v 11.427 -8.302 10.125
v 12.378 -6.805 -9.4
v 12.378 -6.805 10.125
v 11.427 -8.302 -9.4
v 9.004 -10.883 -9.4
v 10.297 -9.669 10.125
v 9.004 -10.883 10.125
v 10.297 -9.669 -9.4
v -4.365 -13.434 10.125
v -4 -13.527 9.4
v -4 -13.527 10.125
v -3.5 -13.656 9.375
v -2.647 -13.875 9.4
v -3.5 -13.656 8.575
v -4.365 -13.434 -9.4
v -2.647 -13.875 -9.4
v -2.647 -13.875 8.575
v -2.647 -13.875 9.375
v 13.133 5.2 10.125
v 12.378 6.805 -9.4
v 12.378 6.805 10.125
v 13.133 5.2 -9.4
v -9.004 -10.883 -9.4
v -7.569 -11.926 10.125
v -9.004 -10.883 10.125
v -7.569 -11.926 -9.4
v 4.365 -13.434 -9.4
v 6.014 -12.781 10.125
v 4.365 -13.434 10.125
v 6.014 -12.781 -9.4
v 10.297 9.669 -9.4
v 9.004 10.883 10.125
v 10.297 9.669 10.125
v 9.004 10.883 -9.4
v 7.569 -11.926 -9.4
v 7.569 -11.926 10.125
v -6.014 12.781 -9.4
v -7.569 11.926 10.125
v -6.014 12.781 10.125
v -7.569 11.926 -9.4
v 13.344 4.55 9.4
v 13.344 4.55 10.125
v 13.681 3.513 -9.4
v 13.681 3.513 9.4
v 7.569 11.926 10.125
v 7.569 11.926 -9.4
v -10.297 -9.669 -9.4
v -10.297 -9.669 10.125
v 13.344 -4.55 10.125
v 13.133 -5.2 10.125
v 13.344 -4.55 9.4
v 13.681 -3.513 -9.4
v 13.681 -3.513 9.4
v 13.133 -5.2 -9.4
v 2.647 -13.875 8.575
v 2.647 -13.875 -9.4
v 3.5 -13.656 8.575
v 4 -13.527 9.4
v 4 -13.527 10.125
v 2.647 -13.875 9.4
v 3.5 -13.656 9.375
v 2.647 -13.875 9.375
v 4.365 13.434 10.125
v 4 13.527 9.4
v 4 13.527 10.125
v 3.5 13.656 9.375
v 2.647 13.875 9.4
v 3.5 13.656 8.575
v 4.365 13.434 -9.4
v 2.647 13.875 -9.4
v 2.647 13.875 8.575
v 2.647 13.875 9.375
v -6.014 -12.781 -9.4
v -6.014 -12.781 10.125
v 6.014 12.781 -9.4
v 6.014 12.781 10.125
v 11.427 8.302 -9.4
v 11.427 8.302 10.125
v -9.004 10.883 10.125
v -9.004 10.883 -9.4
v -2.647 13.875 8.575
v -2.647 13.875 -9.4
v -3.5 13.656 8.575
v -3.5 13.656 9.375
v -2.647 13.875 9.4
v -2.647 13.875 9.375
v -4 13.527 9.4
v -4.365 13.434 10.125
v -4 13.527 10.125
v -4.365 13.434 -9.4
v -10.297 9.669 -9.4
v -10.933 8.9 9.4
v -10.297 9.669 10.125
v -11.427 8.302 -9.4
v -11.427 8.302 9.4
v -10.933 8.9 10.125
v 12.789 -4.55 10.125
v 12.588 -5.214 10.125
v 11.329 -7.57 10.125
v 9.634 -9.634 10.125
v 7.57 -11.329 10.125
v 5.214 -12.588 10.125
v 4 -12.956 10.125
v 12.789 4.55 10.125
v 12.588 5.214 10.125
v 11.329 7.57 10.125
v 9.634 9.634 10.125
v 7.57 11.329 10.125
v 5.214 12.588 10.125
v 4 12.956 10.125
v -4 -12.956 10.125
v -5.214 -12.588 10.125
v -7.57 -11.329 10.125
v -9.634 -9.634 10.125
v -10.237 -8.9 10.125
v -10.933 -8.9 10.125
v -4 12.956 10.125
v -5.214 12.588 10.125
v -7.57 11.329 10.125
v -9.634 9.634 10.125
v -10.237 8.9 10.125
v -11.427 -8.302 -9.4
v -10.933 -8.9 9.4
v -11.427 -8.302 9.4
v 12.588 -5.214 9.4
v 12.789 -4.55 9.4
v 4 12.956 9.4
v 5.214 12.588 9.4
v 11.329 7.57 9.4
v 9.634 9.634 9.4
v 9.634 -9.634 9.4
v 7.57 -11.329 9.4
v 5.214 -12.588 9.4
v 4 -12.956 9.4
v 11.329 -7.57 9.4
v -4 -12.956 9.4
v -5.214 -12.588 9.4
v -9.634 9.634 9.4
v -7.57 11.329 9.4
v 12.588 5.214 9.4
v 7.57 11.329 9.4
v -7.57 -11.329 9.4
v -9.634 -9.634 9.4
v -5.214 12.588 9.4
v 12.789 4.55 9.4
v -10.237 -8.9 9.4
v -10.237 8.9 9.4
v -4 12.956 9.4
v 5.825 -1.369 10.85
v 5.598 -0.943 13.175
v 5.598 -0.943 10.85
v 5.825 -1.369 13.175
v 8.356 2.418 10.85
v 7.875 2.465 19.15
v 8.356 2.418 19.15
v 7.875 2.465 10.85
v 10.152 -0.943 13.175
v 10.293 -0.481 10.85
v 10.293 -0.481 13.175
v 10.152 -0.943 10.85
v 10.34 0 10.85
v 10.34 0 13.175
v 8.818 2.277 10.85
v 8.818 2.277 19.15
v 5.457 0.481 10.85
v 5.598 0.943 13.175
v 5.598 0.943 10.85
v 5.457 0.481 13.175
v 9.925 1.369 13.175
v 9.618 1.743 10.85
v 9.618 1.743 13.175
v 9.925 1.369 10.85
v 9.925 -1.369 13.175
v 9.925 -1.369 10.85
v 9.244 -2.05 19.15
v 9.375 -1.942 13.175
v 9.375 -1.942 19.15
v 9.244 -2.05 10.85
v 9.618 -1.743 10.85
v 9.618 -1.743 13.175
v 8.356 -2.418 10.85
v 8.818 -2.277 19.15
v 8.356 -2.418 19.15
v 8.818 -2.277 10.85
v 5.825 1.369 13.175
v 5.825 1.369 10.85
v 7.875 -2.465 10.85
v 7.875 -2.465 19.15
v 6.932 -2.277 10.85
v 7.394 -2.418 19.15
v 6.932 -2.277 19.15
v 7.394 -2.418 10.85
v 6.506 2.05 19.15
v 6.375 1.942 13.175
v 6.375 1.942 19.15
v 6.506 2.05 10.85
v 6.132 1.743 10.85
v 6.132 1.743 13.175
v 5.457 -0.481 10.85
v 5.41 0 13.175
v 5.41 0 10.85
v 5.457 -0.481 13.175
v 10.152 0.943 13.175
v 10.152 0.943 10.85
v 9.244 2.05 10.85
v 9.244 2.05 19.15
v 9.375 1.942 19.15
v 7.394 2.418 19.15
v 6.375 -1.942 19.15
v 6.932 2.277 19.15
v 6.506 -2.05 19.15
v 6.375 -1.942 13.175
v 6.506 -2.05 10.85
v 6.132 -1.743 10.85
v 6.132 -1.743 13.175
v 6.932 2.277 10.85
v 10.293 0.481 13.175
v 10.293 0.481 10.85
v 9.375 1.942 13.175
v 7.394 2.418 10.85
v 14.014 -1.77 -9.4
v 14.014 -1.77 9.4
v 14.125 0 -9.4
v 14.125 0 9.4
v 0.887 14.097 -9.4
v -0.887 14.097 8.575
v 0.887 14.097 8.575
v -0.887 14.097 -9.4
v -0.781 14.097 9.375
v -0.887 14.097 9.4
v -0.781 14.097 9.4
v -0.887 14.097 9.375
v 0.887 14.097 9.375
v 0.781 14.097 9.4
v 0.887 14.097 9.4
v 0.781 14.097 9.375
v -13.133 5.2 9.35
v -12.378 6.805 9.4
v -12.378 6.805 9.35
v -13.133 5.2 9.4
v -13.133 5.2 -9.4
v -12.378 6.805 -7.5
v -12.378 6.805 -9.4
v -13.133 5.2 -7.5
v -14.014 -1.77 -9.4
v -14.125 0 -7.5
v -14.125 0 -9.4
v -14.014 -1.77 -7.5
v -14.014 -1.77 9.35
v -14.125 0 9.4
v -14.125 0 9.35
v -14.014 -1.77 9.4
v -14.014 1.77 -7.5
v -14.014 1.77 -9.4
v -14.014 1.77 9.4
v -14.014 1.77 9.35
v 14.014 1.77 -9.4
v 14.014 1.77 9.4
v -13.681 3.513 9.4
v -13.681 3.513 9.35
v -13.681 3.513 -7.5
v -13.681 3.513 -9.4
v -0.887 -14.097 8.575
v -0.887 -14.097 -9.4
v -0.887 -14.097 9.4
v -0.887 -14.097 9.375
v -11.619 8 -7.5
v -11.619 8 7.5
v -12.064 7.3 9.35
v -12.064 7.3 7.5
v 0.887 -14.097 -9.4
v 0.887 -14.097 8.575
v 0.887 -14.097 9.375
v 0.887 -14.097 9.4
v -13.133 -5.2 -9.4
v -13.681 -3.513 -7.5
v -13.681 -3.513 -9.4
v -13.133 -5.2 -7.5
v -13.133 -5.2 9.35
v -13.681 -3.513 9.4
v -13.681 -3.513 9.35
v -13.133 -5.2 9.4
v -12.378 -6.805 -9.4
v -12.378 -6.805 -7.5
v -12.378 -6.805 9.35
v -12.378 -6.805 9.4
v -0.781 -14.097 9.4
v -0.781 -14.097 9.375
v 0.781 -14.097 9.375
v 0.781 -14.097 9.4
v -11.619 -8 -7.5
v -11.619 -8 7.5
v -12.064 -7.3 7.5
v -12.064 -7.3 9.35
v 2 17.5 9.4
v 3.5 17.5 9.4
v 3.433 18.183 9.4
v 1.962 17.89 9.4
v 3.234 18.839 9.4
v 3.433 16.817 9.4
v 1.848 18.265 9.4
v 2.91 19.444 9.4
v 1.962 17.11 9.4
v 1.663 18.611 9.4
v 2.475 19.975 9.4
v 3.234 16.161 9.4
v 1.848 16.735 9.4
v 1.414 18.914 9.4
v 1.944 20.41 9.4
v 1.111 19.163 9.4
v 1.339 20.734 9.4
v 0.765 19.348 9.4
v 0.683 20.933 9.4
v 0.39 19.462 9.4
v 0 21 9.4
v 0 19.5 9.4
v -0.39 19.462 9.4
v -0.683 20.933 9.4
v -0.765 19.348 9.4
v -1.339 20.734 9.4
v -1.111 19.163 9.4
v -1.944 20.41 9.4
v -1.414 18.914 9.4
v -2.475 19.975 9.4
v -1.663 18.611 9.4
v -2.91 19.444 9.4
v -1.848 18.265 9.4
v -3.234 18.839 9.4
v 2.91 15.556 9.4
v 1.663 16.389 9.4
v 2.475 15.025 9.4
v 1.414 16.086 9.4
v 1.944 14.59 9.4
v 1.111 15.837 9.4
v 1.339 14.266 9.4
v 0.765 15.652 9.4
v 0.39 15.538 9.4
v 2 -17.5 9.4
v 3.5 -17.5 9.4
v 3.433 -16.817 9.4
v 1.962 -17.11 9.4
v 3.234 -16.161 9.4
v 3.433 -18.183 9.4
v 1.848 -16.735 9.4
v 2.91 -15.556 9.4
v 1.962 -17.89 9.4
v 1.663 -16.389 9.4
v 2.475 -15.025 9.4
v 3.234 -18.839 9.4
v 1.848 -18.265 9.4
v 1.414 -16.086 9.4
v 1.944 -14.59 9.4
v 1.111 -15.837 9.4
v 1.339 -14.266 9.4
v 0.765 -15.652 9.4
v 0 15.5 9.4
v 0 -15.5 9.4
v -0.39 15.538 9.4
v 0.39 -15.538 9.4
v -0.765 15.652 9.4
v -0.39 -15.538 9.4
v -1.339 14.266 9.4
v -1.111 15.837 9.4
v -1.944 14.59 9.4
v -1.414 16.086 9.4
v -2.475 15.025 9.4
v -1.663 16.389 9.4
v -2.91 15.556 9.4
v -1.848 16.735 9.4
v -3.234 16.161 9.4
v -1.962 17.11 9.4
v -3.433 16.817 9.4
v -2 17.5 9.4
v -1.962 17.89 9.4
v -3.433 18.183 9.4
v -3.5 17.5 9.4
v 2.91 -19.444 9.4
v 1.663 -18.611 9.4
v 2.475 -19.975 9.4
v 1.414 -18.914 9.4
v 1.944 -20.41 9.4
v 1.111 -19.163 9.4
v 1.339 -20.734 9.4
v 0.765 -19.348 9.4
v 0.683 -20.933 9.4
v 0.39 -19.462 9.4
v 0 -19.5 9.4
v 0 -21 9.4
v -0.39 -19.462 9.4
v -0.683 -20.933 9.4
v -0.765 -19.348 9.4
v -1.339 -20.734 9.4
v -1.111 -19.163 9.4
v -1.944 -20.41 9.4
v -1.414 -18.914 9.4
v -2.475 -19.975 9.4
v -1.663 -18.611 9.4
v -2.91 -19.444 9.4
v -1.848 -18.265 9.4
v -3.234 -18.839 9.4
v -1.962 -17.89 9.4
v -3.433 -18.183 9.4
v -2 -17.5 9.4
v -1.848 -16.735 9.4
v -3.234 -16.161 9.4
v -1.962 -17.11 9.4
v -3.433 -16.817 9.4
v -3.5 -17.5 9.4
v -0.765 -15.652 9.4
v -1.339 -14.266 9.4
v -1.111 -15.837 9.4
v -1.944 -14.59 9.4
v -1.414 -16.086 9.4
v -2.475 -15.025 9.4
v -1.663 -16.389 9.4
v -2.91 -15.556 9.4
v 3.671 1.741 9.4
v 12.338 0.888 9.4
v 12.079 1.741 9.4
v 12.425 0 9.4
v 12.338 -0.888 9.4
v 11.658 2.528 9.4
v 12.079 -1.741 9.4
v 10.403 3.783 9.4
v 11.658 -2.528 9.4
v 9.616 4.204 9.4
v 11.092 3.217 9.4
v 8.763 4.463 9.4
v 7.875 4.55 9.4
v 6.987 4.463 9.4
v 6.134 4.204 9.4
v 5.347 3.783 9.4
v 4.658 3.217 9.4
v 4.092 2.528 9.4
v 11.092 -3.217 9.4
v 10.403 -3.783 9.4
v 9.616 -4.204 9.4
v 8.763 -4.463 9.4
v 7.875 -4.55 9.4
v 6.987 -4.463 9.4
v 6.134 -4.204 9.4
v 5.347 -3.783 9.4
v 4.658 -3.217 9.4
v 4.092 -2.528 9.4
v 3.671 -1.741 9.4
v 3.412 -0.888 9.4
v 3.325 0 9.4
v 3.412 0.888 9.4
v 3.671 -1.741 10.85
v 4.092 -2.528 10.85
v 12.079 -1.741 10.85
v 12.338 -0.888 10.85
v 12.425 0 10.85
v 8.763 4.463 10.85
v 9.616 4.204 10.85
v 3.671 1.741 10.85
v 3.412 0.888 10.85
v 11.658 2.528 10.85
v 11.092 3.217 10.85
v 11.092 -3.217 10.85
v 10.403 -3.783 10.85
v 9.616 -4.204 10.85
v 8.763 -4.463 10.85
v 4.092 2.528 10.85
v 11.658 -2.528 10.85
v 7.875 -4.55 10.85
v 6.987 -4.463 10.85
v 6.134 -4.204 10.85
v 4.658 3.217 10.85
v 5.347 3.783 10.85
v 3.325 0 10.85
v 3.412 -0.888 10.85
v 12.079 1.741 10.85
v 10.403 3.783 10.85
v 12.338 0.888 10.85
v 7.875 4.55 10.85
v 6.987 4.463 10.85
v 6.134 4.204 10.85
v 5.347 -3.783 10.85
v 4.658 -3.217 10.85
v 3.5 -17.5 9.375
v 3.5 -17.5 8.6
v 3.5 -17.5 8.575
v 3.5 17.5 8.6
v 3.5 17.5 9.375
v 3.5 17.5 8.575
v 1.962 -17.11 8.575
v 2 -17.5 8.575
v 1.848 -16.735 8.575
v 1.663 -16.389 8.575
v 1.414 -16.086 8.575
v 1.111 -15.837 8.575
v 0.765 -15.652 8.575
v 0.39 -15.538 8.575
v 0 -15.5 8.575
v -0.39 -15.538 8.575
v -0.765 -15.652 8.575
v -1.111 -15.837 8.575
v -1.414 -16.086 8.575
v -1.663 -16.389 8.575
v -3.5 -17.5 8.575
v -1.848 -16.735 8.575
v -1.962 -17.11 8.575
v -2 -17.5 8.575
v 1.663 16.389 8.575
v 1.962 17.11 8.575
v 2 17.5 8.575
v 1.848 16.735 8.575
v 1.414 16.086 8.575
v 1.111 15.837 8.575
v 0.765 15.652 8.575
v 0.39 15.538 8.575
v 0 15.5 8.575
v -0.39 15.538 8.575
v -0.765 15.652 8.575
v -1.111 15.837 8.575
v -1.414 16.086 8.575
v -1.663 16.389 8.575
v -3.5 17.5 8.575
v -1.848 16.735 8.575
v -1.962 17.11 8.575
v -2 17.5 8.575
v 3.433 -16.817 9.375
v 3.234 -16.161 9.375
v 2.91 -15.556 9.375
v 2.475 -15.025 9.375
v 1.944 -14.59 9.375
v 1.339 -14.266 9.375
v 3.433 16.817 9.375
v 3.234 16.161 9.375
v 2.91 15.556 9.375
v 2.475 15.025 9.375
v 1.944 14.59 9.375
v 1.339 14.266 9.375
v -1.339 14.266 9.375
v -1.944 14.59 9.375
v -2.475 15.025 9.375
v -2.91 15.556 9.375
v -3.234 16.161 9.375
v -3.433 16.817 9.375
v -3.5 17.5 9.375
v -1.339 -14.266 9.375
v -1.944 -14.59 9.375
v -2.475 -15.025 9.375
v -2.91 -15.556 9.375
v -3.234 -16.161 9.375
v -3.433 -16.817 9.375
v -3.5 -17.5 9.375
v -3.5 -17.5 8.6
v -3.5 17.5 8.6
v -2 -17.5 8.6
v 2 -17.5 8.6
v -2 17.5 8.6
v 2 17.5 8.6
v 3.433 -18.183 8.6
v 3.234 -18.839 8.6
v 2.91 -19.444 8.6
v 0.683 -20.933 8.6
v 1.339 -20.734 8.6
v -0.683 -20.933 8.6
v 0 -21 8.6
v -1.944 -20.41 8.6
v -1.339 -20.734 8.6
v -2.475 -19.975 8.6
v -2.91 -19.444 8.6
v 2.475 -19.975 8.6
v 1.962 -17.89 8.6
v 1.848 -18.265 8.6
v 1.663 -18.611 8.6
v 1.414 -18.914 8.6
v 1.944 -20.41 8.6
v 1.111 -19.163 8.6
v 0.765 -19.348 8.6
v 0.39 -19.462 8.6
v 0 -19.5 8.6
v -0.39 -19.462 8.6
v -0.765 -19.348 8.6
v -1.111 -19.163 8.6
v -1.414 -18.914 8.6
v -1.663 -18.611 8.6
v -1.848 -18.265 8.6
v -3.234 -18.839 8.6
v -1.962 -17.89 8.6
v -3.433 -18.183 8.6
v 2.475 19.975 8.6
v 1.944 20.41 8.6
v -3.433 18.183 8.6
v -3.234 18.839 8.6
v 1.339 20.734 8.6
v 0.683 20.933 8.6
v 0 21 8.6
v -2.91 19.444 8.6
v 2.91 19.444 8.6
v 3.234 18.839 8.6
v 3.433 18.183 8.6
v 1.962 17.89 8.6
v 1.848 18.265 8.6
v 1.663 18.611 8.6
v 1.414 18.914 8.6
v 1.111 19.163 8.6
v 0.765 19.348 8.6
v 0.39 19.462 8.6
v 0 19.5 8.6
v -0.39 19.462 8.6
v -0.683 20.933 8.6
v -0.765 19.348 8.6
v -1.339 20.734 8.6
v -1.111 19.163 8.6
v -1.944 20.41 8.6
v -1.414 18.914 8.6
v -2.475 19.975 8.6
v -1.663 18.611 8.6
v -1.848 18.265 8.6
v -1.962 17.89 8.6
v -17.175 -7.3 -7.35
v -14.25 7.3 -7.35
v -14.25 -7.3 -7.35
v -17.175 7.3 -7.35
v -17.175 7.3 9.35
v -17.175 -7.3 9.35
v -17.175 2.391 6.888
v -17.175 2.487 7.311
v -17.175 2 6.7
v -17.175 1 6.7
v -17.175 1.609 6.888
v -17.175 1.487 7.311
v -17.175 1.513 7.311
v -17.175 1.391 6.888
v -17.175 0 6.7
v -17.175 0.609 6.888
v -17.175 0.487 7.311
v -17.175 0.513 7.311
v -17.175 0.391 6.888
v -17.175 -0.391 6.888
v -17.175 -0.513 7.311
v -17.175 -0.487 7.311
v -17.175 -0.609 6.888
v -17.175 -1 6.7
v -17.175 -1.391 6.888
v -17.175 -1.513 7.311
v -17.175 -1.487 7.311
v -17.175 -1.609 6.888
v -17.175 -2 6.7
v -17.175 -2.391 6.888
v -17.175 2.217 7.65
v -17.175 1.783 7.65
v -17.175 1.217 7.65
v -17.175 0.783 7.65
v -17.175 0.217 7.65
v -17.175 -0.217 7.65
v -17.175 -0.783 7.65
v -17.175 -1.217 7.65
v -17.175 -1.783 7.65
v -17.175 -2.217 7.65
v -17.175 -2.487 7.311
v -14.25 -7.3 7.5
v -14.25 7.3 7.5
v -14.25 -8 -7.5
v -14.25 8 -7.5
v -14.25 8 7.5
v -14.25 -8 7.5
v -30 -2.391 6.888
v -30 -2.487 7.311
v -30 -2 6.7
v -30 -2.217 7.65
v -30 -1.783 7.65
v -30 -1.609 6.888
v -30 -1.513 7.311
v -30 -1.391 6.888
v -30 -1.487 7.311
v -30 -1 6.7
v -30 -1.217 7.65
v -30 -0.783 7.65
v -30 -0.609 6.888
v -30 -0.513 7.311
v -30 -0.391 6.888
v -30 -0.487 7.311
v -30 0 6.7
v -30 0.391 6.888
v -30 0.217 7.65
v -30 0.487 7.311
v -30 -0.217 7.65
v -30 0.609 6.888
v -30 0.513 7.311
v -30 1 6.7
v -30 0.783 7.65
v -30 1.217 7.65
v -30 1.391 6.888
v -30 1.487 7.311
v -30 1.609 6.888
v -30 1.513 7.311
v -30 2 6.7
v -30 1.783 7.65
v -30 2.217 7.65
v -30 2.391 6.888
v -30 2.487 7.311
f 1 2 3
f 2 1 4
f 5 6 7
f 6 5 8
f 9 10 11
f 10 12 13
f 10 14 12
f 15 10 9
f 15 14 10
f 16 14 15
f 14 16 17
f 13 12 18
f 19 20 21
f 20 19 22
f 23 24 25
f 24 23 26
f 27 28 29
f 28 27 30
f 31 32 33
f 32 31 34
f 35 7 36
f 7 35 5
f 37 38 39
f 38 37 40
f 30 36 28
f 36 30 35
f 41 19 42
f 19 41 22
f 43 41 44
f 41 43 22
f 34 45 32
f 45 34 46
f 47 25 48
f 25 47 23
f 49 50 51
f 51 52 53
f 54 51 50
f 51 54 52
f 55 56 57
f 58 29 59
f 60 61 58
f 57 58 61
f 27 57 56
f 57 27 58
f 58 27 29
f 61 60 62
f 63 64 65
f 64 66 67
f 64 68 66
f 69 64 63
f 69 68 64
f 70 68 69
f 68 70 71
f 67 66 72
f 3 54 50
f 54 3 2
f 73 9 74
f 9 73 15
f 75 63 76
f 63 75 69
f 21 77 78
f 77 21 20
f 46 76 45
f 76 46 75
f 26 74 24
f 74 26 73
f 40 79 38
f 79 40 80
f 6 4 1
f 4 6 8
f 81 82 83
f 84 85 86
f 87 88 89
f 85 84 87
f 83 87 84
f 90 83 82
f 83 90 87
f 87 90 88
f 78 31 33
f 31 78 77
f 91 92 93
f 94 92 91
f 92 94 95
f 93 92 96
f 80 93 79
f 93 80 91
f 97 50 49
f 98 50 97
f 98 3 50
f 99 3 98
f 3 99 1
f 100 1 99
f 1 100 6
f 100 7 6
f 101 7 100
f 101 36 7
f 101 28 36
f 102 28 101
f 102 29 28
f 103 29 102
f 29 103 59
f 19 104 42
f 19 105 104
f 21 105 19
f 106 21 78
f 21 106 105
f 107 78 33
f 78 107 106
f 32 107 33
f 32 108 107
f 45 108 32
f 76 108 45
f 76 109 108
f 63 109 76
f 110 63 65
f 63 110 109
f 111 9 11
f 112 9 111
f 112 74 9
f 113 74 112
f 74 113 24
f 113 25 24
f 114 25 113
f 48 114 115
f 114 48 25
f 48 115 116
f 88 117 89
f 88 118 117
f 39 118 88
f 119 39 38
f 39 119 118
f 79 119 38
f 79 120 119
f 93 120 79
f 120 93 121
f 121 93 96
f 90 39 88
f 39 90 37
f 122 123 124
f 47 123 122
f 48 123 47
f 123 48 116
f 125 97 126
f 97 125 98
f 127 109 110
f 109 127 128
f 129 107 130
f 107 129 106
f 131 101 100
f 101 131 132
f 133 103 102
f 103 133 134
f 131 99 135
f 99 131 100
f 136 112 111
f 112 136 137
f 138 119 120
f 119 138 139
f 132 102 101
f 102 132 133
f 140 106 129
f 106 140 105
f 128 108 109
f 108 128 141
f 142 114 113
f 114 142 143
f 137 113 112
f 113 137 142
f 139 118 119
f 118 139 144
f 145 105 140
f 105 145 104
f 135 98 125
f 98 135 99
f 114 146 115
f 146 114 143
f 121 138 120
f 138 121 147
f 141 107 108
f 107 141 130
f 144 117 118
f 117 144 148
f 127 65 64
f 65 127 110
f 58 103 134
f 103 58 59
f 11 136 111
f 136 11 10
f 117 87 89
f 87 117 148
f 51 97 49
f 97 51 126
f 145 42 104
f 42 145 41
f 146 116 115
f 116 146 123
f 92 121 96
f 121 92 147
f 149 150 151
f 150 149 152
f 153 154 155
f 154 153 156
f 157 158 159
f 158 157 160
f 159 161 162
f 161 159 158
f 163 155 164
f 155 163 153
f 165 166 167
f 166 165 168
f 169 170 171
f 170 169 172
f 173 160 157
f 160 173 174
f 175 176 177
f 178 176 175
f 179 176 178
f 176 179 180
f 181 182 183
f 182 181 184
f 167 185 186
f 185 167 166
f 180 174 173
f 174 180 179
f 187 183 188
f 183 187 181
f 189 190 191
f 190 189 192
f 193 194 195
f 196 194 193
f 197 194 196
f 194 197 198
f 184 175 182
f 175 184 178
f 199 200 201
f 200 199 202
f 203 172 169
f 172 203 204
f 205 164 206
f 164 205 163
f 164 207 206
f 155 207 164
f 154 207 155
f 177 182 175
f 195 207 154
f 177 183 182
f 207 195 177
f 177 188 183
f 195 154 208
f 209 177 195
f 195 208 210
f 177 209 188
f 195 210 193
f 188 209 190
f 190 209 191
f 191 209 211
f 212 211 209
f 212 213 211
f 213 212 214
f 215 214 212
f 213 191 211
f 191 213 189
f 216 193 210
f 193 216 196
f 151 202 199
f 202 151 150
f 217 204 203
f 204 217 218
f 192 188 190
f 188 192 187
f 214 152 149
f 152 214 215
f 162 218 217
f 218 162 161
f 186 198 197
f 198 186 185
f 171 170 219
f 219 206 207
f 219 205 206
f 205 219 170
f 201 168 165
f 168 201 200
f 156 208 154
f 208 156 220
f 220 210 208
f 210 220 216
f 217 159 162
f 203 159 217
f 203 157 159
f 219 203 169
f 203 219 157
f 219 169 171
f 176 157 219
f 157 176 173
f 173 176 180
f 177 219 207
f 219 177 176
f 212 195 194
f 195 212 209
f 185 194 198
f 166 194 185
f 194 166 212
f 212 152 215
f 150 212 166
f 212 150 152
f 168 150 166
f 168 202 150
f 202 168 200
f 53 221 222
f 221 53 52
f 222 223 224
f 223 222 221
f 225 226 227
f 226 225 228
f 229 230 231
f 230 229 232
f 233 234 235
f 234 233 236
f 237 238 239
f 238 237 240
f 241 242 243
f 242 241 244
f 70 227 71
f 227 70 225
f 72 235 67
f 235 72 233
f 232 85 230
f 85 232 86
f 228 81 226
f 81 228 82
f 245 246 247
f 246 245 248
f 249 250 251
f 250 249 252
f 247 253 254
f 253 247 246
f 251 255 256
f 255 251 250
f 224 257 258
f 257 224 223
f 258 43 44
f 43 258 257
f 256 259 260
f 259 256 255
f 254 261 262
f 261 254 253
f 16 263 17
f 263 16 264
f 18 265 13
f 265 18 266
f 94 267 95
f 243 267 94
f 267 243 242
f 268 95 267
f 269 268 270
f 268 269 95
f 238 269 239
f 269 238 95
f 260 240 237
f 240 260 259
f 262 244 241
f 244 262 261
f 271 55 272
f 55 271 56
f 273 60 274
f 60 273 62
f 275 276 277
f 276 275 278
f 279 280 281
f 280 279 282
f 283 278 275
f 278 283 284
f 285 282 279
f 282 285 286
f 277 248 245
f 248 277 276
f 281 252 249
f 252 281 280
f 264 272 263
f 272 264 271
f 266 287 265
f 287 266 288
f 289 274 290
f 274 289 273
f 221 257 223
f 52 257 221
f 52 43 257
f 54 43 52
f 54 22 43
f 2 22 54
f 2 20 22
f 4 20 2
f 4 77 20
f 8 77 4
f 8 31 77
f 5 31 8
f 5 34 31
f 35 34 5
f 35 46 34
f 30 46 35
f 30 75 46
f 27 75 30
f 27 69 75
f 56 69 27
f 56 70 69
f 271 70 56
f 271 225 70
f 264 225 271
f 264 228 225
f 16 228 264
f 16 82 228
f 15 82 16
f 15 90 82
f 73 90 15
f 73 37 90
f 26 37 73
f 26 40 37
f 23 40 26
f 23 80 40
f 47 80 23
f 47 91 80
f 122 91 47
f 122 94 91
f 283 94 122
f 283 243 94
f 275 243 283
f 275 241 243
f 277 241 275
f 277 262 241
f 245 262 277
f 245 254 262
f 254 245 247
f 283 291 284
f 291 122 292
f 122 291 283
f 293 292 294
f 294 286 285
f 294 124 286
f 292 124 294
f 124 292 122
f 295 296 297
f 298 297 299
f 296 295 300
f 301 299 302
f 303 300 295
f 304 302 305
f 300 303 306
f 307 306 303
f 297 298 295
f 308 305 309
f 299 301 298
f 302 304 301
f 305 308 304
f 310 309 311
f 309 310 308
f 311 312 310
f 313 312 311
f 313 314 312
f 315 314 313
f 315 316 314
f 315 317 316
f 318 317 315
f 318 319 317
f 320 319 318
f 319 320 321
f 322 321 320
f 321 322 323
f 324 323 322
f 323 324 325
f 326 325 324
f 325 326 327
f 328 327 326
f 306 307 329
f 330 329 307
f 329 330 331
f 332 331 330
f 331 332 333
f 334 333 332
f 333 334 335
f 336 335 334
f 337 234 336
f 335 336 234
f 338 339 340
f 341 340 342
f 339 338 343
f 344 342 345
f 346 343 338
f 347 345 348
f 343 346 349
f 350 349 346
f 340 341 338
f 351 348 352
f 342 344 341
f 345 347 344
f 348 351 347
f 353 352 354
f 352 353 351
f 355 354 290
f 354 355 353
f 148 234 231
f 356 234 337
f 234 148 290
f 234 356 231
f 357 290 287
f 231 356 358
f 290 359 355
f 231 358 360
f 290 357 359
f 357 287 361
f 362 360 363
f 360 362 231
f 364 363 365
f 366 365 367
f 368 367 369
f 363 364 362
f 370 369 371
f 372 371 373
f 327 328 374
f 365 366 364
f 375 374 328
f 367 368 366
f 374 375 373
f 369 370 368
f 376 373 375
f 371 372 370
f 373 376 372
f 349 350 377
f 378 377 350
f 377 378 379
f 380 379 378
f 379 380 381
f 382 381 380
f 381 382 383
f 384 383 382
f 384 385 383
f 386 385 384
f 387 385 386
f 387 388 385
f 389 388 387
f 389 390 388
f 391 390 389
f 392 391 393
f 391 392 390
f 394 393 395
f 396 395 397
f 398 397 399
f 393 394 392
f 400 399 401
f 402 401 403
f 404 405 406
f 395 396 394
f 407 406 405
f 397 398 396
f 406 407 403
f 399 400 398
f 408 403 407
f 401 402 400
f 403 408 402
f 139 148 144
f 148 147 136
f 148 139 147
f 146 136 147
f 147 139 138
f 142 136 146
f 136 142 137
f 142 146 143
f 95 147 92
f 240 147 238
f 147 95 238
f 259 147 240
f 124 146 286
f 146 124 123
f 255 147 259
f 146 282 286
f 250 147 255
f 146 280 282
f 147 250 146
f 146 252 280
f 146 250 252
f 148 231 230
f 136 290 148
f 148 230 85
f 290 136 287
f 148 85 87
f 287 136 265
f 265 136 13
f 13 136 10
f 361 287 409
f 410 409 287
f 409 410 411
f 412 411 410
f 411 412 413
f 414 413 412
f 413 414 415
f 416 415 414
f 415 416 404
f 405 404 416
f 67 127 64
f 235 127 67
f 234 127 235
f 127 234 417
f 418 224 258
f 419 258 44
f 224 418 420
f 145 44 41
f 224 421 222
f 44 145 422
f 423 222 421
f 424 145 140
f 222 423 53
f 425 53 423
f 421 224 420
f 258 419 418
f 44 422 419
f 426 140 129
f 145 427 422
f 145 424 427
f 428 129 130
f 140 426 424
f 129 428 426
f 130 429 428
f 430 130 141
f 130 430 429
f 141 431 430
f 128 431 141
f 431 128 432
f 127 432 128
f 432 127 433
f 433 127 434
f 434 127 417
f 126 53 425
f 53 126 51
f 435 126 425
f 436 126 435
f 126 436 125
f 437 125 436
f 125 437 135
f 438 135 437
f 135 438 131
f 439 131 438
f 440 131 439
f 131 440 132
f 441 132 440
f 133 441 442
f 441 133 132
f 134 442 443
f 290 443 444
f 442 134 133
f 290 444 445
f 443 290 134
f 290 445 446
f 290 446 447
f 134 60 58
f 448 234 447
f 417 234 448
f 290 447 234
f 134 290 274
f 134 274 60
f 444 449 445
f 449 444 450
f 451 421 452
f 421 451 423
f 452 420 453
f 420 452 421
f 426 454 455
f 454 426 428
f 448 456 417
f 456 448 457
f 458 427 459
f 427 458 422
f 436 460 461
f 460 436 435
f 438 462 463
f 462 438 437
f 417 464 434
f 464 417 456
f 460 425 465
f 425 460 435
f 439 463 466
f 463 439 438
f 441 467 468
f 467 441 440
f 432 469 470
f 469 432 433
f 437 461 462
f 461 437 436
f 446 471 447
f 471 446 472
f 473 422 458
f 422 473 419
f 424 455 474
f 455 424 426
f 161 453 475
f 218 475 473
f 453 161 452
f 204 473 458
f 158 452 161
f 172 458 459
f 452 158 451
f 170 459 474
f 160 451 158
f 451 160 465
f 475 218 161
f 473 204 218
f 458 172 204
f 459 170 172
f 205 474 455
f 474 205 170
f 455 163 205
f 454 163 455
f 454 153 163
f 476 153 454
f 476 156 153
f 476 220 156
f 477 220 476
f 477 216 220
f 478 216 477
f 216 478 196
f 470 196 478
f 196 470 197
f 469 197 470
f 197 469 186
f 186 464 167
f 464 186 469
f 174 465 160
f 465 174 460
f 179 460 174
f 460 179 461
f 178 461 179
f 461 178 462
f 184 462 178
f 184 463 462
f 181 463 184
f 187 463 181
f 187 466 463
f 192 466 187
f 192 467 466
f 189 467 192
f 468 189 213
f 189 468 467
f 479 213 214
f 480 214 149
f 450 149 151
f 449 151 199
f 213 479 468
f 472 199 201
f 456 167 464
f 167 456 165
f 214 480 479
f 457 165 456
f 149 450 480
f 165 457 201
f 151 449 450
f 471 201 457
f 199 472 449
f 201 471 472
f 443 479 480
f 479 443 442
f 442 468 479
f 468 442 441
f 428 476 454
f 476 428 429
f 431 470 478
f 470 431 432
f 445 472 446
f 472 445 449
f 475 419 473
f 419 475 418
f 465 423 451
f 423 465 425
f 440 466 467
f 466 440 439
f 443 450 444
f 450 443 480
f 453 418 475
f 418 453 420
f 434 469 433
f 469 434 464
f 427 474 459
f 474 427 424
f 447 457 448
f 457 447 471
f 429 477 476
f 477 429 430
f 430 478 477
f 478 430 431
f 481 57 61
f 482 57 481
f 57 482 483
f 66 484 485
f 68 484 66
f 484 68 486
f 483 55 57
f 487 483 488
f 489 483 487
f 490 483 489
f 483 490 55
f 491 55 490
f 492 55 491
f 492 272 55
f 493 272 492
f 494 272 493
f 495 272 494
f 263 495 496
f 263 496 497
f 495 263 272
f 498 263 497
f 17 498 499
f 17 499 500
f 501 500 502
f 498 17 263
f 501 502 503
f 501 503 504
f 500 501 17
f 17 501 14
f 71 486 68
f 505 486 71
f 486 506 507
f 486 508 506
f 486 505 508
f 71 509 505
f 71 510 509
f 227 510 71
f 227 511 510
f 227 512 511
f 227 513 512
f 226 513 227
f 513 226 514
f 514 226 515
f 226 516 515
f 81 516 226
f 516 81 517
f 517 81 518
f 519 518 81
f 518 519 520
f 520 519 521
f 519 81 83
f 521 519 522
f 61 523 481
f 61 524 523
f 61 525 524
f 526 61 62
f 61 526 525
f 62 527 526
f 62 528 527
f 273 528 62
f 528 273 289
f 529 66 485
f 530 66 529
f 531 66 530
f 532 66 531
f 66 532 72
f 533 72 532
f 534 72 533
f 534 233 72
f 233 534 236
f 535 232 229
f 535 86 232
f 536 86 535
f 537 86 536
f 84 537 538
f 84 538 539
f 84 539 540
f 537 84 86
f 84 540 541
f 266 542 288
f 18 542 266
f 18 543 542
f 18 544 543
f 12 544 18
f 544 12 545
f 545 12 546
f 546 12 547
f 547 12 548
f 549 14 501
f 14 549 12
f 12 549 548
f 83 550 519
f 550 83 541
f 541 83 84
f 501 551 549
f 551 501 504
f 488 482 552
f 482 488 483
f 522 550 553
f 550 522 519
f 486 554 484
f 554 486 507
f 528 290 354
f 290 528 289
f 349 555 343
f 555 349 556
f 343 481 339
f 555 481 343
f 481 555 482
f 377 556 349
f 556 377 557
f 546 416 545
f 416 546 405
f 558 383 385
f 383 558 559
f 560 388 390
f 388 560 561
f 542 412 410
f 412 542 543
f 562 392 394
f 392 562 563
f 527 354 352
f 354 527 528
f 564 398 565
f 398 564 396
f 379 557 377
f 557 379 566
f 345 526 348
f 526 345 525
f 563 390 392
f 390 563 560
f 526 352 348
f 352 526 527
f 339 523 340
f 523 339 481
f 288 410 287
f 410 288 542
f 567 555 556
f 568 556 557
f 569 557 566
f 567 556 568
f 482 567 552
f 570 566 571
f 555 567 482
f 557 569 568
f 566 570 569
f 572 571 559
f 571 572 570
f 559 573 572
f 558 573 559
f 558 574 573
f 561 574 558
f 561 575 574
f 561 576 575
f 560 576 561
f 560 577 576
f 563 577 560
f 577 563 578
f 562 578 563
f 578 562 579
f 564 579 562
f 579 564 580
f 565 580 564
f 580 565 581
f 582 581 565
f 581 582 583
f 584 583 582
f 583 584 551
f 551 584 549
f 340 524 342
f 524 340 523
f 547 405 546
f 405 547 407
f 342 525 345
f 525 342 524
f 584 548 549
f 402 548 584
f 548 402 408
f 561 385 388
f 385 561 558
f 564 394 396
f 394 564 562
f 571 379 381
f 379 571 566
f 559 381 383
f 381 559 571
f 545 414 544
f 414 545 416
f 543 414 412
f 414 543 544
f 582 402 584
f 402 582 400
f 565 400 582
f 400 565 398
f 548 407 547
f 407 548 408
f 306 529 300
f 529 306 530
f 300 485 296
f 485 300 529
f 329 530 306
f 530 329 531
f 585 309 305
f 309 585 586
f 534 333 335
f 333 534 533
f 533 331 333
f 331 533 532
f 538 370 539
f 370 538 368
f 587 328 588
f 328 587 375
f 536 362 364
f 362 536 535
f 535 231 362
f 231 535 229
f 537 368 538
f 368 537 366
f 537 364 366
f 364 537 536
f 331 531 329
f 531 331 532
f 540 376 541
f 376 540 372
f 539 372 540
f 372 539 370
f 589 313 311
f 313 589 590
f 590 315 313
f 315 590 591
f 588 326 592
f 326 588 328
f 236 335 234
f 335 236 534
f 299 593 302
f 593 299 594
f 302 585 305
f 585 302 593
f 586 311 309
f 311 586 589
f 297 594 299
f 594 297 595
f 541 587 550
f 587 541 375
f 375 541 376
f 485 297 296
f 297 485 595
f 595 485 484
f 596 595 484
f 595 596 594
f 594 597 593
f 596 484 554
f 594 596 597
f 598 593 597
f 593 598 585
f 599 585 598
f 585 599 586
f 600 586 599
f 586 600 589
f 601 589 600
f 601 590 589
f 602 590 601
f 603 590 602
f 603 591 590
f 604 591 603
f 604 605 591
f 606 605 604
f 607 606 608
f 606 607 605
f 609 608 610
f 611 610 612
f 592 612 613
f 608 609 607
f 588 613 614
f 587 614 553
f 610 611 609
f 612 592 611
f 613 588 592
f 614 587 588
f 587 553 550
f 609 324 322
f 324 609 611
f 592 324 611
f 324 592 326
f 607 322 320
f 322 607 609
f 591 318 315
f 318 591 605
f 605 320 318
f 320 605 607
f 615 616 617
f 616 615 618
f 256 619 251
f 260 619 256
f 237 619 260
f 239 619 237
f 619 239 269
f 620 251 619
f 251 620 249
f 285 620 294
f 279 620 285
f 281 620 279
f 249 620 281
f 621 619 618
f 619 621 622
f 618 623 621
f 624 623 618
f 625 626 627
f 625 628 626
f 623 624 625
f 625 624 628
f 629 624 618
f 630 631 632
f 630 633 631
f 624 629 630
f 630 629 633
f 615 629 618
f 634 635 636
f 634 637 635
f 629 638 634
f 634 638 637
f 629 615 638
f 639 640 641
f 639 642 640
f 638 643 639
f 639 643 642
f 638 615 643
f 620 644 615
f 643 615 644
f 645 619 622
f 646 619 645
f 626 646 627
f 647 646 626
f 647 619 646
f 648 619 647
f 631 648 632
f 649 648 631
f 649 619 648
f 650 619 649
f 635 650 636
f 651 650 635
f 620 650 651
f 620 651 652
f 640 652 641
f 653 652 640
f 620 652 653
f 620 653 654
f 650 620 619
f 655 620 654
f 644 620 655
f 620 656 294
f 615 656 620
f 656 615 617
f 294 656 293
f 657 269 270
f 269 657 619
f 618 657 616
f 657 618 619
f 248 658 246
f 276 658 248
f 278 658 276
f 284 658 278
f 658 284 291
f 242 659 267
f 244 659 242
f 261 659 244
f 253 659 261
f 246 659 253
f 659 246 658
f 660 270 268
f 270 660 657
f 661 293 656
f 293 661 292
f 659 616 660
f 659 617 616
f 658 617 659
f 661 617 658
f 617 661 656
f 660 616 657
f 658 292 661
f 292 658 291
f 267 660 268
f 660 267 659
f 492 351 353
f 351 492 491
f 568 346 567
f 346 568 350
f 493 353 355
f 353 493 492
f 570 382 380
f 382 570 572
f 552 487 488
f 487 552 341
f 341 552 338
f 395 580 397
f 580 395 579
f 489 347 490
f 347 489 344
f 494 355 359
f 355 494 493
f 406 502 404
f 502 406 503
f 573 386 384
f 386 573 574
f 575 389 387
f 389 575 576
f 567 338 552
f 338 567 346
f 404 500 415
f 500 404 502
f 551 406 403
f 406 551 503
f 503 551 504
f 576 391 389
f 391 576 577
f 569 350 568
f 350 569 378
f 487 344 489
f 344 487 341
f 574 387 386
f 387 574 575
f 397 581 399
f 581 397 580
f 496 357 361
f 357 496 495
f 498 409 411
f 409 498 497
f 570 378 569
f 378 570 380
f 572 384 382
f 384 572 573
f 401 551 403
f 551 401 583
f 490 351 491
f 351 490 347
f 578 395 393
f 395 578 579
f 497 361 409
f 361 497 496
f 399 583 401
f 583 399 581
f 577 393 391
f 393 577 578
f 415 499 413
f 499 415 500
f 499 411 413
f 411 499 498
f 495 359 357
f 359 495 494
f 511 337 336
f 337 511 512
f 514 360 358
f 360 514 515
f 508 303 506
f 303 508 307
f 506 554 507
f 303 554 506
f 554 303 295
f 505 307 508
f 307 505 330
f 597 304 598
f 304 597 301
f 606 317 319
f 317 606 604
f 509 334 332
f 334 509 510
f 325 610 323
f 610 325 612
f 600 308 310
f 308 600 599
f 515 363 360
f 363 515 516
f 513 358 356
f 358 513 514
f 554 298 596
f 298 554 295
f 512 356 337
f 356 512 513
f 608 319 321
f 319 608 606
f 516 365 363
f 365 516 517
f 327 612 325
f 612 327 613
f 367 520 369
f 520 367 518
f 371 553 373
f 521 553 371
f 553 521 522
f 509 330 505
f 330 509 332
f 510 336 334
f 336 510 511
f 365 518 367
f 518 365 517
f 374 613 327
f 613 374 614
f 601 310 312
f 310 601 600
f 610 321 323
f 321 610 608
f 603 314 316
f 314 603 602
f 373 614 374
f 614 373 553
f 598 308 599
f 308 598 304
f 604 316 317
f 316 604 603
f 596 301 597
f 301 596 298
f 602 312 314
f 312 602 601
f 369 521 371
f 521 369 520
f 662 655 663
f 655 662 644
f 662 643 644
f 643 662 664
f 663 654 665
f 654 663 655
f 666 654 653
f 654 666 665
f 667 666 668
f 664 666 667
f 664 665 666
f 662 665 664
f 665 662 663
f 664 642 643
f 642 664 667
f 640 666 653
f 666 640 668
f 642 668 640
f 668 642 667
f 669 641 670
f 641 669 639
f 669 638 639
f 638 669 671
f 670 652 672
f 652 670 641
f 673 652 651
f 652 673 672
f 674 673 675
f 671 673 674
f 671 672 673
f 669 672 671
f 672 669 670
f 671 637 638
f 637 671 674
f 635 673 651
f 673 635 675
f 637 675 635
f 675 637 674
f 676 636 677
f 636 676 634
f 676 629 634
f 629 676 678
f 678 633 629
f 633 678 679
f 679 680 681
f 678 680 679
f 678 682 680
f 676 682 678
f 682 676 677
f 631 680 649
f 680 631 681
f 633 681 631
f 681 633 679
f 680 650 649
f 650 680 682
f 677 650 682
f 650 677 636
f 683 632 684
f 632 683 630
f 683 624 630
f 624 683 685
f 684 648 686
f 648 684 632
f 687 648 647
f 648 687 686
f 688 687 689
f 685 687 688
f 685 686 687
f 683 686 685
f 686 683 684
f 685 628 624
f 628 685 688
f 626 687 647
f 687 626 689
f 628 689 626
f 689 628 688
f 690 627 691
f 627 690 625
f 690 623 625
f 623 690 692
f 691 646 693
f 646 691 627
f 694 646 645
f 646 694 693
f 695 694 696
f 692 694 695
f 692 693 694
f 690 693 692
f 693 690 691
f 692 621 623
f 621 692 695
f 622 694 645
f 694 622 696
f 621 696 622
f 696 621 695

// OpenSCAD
// 28BYJ-48 from RGriffoGoes 
// at http://www.thingiverse.com/thing:204734
// named and measured dimensions, and
// added details by J.Beale 21 July 2014

MBH = 18.8;   // motor body height
MBD = 28.25;  // motor body OD
SBD = 9.1;    // shaft boss OD
SBH = 1.45;   // shaft boss height above motor body
SBO = 7.875;  // offset of shaft/boss center from motor center
SHD = 4.93;   // motor shaft OD
SHDF = 3.0;   // motor shaft diameter, across flats
SHHF = 6.0;   // motor shaft flats height, or depth in from end
SHH = 9.75;   // height of shaft above motor body 

MBFH = 0.7;   // height of body edge flange protruding above surface
MBFW = 1.0;   // width of edge flange
MBFNW = 8;    // width of notch in edge flange
MBFNW2 = 17.8;  // width of edge flange notch above wiring box

MHCC = 35.0;  // mounting hole center-to-center
MTH  = 0.8;   // mounting tab thickness
MTW  = 7.0;   // mounting tab width
WBH  = 16.7;  // plastic wiring box height
WBW  = 14.6;  // plastic wiring box width
WBD  = 31.3;  // body diameter to outer surface of wiring box

WRD = 1.0;     // diameter of electrical wires
WRL = 30;      // length of electrical wires
WRO = 2.2;		// offset of wires below top motor surface

// =========================================================
eps = 0.05;   // small number to avoid coincident faces


module wires() {
 
  color([0.9,0.9,0]) translate([0,WRD*2,0]) cylinder(h=WRL,r=WRD/2, $fn = 7);
  color([.9,.45,0]) translate([0,WRD*1,0]) cylinder(h=WRL,r=WRD/2, $fn = 7);   
  color([1,0,0]) translate([0,0,0]) cylinder(h=WRL,r=WRD/2, $fn = 7);
  color([1,.6,.6]) translate([0,-WRD*1,0]) cylinder(h=WRL,r=WRD/2, $fn = 7);
  color([.2,.2,1]) translate([0,-WRD*2,0]) cylinder(h=WRL,r=WRD/2, $fn = 7);
}

module StepMotor28BYJ()
{
  difference(){
    union(){
	   color("gray") translate([0,0,-(MBH+MBFH)/2])
		  difference() {  // flange at top rim
         cylinder(h = MBFH+eps, r = MBD/2, center = true, $fn = 50);
         cylinder(h = MBFH+2*eps, r = (MBD-MBFW)/2, center = true, $fn = 32);
			cube([MBFNW,MHCC,MBFH*2],center=true); // notches in rim
			cube([MBD+2*MBFW,SBD,MBFH*2],center=true);
		   translate([-MBD/2,0,0]) cube([MBD,MBFNW2,MBFH*2],center=true);
        }
		color("gray") // motor body
			cylinder(h = MBH, r = MBD/2, center = true, $fn = 50);
		color("gray") translate([SBO,0,-SBH])	// shaft boss
			cylinder(h = MBH, r = SBD/2, center = true, $fn = 32);

		translate([SBO,0,-SHH])	// motor shaft
        difference() {
			color("gold") cylinder(h = MBH, r = SHD/2, center = true, $fn = 32);
				// shaft flats
		   color("red") translate([(SHD+SHDF)/2,0,-(eps+MBH-SHHF)/2]) 
				cube([SHD,SHD,SHHF], center = true);
		   color("red") translate([-(SHD+SHDF)/2,0,-(eps+MBH-SHHF)/2]) 
				cube([SHD,SHD,SHHF], center = true);
        }


		color("Silver") translate([0,0,-(MBH-MTH-eps)/2]) // mounting tab 
			cube([MTW,MHCC,MTH], center = true);				
		color("Silver") translate([0,MHCC/2,-(MBH-MTH)/2]) // mt.tab rounded end
			cylinder(h = MTH, r = MTW/2, center = true, $fn = 32);
		color("Silver") translate([0,-MHCC/2,-(MBH-MTH)/2]) // mt.tab rounded end
			cylinder(h = MTH, r = MTW/2, center = true, $fn = 32);


		color("blue") translate([-(WBD-MBD),0,eps-(MBH-WBH)/2]) // plastic wire box
			cube([MBD,WBW,WBH], center = true);
	   color("blue") translate([-2,0,0])	
			cube([24.5,16,15], center = true);
		}

				// mounting holes in tabs on side
		color("red") translate([0,MHCC/2,-MBH/2])	
				cylinder(h = 2, r = 2, center = true, $fn = 32);
		color("red") translate([0,-MHCC/2,-MBH/2])	
				cylinder(h = 2, r = 2, center = true, $fn = 32);
		}
	}

rotate([180,0,0]) {

  StepMotor28BYJ();  // motor body (without wires)

  // 5 colored hookup wires
  translate([0,0,-(MBH/2 - WRO)]) rotate([0,-90,0])  
	  wires();
}
